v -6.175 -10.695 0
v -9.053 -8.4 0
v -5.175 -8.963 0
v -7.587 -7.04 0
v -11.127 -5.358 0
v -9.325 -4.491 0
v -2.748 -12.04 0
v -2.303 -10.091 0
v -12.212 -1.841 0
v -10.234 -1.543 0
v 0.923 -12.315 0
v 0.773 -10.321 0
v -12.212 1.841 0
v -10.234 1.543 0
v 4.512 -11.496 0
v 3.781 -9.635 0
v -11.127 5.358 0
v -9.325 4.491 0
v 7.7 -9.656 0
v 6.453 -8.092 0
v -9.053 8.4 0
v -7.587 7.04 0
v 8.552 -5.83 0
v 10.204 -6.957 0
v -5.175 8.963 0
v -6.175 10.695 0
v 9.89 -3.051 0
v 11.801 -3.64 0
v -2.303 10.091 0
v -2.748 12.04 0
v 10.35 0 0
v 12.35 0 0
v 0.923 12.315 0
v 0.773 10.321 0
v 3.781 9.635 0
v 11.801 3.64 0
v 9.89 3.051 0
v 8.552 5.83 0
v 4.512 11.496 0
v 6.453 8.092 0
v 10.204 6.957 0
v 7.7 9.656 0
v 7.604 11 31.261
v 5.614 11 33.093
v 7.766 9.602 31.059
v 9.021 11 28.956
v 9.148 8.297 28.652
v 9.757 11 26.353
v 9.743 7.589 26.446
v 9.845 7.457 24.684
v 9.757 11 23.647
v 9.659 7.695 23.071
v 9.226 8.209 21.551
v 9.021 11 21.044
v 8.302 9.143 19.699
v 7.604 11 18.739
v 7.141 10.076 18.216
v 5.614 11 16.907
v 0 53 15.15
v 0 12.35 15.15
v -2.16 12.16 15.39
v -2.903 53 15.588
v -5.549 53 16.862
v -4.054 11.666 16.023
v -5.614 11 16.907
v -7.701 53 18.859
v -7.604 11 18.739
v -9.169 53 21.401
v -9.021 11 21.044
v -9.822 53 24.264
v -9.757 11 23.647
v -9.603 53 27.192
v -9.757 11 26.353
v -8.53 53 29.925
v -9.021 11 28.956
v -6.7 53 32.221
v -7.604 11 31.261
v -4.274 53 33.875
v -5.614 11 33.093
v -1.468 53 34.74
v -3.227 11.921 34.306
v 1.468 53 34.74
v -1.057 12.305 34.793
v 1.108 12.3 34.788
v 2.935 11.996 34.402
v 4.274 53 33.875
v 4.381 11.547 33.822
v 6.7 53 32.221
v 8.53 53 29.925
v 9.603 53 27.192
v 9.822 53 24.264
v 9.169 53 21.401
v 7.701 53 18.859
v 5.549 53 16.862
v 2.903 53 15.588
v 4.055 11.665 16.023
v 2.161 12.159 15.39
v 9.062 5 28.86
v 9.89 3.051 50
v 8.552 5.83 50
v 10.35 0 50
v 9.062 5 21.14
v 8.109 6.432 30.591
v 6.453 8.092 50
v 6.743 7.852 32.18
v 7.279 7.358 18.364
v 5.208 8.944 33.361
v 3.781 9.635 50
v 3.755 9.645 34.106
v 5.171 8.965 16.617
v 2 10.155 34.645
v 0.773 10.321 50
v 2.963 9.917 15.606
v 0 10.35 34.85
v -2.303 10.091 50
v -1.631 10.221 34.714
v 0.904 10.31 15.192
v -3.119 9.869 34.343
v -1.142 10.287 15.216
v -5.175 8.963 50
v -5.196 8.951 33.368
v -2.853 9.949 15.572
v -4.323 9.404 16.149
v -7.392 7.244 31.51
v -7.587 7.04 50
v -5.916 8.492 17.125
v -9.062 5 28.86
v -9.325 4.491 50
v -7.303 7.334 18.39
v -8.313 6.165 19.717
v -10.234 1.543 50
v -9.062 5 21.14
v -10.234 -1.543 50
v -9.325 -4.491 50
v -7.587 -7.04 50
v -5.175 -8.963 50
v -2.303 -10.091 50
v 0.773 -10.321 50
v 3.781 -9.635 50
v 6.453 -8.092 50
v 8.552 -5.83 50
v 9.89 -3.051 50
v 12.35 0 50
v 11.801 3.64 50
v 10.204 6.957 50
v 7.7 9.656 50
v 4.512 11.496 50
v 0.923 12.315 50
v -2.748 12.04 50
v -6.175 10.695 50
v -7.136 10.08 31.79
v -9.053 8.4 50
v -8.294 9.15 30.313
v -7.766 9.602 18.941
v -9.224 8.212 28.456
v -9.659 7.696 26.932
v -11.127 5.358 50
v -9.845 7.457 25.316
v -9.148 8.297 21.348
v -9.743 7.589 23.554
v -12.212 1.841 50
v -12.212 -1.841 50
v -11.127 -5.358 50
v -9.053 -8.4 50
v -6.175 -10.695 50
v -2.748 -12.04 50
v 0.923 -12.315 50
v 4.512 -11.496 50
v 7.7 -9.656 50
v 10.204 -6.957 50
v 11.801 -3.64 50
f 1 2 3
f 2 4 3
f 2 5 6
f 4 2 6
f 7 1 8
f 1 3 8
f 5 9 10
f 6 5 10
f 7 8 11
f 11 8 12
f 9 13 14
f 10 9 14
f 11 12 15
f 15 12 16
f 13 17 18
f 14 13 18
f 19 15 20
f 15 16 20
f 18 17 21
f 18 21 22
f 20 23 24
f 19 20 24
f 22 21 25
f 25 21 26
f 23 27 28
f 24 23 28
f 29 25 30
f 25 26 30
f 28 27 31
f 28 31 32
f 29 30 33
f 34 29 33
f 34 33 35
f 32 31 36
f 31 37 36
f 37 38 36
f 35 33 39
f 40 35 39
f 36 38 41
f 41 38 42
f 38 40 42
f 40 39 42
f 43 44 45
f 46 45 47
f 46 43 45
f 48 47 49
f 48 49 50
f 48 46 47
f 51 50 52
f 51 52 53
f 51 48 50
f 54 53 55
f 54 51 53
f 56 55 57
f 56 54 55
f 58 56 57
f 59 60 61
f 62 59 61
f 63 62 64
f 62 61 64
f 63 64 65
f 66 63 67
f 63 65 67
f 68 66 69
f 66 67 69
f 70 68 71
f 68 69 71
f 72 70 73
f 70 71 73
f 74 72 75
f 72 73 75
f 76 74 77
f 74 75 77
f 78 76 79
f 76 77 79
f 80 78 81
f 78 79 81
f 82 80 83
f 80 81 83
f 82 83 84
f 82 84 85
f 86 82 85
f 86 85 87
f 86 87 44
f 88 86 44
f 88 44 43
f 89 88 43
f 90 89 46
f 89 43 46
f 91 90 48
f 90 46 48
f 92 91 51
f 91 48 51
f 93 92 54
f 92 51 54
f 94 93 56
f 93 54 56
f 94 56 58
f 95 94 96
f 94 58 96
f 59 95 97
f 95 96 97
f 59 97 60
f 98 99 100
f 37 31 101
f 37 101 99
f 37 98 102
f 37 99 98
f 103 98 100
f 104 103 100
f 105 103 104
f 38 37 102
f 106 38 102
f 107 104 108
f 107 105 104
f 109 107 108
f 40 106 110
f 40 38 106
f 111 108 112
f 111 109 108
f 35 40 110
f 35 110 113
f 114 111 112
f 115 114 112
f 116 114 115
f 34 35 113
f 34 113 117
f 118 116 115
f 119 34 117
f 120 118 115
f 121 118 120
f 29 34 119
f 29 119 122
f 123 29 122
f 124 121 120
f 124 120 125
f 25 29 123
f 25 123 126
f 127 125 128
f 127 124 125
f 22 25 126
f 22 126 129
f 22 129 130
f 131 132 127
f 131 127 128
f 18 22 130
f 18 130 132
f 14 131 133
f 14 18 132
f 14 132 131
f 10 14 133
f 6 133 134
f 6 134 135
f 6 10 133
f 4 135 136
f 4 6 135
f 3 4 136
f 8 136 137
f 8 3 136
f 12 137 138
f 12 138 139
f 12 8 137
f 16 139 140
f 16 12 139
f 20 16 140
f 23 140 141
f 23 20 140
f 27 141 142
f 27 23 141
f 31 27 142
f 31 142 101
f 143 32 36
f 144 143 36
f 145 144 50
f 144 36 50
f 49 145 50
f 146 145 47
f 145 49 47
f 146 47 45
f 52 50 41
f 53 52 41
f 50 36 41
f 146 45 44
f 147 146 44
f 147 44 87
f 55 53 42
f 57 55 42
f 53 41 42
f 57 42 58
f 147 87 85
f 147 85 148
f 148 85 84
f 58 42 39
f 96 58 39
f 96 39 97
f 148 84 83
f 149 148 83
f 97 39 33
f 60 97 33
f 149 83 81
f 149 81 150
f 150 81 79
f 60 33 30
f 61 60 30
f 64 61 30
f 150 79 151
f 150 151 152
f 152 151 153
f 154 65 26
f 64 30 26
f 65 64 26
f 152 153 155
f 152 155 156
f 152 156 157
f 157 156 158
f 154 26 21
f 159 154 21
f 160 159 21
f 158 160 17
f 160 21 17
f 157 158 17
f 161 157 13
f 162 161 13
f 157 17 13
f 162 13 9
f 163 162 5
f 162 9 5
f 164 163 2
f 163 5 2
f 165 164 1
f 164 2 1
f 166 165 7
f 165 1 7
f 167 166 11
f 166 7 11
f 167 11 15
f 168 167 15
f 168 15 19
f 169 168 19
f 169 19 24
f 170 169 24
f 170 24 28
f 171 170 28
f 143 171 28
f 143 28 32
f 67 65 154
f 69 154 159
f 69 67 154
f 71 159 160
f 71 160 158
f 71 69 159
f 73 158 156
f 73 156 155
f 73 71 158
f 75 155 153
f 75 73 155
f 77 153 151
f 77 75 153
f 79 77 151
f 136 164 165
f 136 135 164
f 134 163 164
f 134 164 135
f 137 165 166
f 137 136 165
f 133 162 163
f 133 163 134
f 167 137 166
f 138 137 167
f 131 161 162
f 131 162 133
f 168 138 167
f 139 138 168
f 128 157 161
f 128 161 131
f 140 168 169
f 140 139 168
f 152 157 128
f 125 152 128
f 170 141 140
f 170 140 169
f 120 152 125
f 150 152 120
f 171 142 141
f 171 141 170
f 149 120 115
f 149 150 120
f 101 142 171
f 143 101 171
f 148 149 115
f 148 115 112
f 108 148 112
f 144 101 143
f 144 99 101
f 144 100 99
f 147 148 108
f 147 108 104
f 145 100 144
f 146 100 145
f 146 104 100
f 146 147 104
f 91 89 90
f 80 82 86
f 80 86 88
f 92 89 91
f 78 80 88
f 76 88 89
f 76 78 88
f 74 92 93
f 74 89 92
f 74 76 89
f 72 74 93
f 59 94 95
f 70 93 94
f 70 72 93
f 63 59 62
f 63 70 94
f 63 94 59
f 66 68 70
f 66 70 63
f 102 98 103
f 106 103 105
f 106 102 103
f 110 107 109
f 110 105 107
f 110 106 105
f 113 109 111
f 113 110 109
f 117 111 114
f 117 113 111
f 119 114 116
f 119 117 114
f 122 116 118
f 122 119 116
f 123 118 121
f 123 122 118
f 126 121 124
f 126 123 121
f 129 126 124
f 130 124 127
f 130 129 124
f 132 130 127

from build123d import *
from build123d.topology import SkipClean

# Parameters (mm, degrees)
SKETCH1_R           = 12.35
SKETCH1_R_2         = 10.35
BOSS_EXTRUDE1_DEPTH = 50
SKETCH2_R           = 9.85
BOSS_EXTRUDE2_DEPTH = 42
SKETCH2_3_R         = 9.85
BOSS_EXTRUDE3_DEPTH = 6
SKETCH1_2_R         = 10.35
CUT_EXTRUDE1_DEPTH  = 51


with BuildPart() as part:
    # Sketch1 → Boss-Extrude1 (new body)
    with BuildSketch(Plane.XY):
        Circle(SKETCH1_R)
        Circle(SKETCH1_R_2, mode=Mode.SUBTRACT)
    extrude(amount=BOSS_EXTRUDE1_DEPTH)



with BuildPart() as body_2:
    # Sketch2 → Boss-Extrude2 (new body)
    with BuildSketch(Plane(origin=(0, 11, 0), x_dir=(1, 0, 0), z_dir=(0, 1, 0))):
        with Locations((0, -25)):
            Circle(SKETCH2_R)
    extrude(amount=BOSS_EXTRUDE2_DEPTH)


with BuildPart() as part_1:
    with SkipClean():  # the faces are left unmerged after this step: merging them gives an invalid solid
        add(part.part)

        add(body_2.part)  # Boss-Extrude3 merges body 2
        # Sketch2<3> → Boss-Extrude3 (add)
        with BuildSketch(Plane(origin=(0, 11, 0), x_dir=(1, 0, 0), z_dir=(0, 1, 0))):
            with Locations((0, -25)):
                Circle(SKETCH2_3_R)
        extrude(amount=-BOSS_EXTRUDE3_DEPTH)

    # Sketch1<2> → Cut-Extrude1 (cut)
    with SkipClean():  # the faces are left unmerged after this step: merging them gives an invalid solid
        with BuildSketch(Plane.XY):
            Circle(SKETCH1_2_R)
        extrude(amount=CUT_EXTRUDE1_DEPTH, mode=Mode.SUBTRACT)


solid = part_1.part
